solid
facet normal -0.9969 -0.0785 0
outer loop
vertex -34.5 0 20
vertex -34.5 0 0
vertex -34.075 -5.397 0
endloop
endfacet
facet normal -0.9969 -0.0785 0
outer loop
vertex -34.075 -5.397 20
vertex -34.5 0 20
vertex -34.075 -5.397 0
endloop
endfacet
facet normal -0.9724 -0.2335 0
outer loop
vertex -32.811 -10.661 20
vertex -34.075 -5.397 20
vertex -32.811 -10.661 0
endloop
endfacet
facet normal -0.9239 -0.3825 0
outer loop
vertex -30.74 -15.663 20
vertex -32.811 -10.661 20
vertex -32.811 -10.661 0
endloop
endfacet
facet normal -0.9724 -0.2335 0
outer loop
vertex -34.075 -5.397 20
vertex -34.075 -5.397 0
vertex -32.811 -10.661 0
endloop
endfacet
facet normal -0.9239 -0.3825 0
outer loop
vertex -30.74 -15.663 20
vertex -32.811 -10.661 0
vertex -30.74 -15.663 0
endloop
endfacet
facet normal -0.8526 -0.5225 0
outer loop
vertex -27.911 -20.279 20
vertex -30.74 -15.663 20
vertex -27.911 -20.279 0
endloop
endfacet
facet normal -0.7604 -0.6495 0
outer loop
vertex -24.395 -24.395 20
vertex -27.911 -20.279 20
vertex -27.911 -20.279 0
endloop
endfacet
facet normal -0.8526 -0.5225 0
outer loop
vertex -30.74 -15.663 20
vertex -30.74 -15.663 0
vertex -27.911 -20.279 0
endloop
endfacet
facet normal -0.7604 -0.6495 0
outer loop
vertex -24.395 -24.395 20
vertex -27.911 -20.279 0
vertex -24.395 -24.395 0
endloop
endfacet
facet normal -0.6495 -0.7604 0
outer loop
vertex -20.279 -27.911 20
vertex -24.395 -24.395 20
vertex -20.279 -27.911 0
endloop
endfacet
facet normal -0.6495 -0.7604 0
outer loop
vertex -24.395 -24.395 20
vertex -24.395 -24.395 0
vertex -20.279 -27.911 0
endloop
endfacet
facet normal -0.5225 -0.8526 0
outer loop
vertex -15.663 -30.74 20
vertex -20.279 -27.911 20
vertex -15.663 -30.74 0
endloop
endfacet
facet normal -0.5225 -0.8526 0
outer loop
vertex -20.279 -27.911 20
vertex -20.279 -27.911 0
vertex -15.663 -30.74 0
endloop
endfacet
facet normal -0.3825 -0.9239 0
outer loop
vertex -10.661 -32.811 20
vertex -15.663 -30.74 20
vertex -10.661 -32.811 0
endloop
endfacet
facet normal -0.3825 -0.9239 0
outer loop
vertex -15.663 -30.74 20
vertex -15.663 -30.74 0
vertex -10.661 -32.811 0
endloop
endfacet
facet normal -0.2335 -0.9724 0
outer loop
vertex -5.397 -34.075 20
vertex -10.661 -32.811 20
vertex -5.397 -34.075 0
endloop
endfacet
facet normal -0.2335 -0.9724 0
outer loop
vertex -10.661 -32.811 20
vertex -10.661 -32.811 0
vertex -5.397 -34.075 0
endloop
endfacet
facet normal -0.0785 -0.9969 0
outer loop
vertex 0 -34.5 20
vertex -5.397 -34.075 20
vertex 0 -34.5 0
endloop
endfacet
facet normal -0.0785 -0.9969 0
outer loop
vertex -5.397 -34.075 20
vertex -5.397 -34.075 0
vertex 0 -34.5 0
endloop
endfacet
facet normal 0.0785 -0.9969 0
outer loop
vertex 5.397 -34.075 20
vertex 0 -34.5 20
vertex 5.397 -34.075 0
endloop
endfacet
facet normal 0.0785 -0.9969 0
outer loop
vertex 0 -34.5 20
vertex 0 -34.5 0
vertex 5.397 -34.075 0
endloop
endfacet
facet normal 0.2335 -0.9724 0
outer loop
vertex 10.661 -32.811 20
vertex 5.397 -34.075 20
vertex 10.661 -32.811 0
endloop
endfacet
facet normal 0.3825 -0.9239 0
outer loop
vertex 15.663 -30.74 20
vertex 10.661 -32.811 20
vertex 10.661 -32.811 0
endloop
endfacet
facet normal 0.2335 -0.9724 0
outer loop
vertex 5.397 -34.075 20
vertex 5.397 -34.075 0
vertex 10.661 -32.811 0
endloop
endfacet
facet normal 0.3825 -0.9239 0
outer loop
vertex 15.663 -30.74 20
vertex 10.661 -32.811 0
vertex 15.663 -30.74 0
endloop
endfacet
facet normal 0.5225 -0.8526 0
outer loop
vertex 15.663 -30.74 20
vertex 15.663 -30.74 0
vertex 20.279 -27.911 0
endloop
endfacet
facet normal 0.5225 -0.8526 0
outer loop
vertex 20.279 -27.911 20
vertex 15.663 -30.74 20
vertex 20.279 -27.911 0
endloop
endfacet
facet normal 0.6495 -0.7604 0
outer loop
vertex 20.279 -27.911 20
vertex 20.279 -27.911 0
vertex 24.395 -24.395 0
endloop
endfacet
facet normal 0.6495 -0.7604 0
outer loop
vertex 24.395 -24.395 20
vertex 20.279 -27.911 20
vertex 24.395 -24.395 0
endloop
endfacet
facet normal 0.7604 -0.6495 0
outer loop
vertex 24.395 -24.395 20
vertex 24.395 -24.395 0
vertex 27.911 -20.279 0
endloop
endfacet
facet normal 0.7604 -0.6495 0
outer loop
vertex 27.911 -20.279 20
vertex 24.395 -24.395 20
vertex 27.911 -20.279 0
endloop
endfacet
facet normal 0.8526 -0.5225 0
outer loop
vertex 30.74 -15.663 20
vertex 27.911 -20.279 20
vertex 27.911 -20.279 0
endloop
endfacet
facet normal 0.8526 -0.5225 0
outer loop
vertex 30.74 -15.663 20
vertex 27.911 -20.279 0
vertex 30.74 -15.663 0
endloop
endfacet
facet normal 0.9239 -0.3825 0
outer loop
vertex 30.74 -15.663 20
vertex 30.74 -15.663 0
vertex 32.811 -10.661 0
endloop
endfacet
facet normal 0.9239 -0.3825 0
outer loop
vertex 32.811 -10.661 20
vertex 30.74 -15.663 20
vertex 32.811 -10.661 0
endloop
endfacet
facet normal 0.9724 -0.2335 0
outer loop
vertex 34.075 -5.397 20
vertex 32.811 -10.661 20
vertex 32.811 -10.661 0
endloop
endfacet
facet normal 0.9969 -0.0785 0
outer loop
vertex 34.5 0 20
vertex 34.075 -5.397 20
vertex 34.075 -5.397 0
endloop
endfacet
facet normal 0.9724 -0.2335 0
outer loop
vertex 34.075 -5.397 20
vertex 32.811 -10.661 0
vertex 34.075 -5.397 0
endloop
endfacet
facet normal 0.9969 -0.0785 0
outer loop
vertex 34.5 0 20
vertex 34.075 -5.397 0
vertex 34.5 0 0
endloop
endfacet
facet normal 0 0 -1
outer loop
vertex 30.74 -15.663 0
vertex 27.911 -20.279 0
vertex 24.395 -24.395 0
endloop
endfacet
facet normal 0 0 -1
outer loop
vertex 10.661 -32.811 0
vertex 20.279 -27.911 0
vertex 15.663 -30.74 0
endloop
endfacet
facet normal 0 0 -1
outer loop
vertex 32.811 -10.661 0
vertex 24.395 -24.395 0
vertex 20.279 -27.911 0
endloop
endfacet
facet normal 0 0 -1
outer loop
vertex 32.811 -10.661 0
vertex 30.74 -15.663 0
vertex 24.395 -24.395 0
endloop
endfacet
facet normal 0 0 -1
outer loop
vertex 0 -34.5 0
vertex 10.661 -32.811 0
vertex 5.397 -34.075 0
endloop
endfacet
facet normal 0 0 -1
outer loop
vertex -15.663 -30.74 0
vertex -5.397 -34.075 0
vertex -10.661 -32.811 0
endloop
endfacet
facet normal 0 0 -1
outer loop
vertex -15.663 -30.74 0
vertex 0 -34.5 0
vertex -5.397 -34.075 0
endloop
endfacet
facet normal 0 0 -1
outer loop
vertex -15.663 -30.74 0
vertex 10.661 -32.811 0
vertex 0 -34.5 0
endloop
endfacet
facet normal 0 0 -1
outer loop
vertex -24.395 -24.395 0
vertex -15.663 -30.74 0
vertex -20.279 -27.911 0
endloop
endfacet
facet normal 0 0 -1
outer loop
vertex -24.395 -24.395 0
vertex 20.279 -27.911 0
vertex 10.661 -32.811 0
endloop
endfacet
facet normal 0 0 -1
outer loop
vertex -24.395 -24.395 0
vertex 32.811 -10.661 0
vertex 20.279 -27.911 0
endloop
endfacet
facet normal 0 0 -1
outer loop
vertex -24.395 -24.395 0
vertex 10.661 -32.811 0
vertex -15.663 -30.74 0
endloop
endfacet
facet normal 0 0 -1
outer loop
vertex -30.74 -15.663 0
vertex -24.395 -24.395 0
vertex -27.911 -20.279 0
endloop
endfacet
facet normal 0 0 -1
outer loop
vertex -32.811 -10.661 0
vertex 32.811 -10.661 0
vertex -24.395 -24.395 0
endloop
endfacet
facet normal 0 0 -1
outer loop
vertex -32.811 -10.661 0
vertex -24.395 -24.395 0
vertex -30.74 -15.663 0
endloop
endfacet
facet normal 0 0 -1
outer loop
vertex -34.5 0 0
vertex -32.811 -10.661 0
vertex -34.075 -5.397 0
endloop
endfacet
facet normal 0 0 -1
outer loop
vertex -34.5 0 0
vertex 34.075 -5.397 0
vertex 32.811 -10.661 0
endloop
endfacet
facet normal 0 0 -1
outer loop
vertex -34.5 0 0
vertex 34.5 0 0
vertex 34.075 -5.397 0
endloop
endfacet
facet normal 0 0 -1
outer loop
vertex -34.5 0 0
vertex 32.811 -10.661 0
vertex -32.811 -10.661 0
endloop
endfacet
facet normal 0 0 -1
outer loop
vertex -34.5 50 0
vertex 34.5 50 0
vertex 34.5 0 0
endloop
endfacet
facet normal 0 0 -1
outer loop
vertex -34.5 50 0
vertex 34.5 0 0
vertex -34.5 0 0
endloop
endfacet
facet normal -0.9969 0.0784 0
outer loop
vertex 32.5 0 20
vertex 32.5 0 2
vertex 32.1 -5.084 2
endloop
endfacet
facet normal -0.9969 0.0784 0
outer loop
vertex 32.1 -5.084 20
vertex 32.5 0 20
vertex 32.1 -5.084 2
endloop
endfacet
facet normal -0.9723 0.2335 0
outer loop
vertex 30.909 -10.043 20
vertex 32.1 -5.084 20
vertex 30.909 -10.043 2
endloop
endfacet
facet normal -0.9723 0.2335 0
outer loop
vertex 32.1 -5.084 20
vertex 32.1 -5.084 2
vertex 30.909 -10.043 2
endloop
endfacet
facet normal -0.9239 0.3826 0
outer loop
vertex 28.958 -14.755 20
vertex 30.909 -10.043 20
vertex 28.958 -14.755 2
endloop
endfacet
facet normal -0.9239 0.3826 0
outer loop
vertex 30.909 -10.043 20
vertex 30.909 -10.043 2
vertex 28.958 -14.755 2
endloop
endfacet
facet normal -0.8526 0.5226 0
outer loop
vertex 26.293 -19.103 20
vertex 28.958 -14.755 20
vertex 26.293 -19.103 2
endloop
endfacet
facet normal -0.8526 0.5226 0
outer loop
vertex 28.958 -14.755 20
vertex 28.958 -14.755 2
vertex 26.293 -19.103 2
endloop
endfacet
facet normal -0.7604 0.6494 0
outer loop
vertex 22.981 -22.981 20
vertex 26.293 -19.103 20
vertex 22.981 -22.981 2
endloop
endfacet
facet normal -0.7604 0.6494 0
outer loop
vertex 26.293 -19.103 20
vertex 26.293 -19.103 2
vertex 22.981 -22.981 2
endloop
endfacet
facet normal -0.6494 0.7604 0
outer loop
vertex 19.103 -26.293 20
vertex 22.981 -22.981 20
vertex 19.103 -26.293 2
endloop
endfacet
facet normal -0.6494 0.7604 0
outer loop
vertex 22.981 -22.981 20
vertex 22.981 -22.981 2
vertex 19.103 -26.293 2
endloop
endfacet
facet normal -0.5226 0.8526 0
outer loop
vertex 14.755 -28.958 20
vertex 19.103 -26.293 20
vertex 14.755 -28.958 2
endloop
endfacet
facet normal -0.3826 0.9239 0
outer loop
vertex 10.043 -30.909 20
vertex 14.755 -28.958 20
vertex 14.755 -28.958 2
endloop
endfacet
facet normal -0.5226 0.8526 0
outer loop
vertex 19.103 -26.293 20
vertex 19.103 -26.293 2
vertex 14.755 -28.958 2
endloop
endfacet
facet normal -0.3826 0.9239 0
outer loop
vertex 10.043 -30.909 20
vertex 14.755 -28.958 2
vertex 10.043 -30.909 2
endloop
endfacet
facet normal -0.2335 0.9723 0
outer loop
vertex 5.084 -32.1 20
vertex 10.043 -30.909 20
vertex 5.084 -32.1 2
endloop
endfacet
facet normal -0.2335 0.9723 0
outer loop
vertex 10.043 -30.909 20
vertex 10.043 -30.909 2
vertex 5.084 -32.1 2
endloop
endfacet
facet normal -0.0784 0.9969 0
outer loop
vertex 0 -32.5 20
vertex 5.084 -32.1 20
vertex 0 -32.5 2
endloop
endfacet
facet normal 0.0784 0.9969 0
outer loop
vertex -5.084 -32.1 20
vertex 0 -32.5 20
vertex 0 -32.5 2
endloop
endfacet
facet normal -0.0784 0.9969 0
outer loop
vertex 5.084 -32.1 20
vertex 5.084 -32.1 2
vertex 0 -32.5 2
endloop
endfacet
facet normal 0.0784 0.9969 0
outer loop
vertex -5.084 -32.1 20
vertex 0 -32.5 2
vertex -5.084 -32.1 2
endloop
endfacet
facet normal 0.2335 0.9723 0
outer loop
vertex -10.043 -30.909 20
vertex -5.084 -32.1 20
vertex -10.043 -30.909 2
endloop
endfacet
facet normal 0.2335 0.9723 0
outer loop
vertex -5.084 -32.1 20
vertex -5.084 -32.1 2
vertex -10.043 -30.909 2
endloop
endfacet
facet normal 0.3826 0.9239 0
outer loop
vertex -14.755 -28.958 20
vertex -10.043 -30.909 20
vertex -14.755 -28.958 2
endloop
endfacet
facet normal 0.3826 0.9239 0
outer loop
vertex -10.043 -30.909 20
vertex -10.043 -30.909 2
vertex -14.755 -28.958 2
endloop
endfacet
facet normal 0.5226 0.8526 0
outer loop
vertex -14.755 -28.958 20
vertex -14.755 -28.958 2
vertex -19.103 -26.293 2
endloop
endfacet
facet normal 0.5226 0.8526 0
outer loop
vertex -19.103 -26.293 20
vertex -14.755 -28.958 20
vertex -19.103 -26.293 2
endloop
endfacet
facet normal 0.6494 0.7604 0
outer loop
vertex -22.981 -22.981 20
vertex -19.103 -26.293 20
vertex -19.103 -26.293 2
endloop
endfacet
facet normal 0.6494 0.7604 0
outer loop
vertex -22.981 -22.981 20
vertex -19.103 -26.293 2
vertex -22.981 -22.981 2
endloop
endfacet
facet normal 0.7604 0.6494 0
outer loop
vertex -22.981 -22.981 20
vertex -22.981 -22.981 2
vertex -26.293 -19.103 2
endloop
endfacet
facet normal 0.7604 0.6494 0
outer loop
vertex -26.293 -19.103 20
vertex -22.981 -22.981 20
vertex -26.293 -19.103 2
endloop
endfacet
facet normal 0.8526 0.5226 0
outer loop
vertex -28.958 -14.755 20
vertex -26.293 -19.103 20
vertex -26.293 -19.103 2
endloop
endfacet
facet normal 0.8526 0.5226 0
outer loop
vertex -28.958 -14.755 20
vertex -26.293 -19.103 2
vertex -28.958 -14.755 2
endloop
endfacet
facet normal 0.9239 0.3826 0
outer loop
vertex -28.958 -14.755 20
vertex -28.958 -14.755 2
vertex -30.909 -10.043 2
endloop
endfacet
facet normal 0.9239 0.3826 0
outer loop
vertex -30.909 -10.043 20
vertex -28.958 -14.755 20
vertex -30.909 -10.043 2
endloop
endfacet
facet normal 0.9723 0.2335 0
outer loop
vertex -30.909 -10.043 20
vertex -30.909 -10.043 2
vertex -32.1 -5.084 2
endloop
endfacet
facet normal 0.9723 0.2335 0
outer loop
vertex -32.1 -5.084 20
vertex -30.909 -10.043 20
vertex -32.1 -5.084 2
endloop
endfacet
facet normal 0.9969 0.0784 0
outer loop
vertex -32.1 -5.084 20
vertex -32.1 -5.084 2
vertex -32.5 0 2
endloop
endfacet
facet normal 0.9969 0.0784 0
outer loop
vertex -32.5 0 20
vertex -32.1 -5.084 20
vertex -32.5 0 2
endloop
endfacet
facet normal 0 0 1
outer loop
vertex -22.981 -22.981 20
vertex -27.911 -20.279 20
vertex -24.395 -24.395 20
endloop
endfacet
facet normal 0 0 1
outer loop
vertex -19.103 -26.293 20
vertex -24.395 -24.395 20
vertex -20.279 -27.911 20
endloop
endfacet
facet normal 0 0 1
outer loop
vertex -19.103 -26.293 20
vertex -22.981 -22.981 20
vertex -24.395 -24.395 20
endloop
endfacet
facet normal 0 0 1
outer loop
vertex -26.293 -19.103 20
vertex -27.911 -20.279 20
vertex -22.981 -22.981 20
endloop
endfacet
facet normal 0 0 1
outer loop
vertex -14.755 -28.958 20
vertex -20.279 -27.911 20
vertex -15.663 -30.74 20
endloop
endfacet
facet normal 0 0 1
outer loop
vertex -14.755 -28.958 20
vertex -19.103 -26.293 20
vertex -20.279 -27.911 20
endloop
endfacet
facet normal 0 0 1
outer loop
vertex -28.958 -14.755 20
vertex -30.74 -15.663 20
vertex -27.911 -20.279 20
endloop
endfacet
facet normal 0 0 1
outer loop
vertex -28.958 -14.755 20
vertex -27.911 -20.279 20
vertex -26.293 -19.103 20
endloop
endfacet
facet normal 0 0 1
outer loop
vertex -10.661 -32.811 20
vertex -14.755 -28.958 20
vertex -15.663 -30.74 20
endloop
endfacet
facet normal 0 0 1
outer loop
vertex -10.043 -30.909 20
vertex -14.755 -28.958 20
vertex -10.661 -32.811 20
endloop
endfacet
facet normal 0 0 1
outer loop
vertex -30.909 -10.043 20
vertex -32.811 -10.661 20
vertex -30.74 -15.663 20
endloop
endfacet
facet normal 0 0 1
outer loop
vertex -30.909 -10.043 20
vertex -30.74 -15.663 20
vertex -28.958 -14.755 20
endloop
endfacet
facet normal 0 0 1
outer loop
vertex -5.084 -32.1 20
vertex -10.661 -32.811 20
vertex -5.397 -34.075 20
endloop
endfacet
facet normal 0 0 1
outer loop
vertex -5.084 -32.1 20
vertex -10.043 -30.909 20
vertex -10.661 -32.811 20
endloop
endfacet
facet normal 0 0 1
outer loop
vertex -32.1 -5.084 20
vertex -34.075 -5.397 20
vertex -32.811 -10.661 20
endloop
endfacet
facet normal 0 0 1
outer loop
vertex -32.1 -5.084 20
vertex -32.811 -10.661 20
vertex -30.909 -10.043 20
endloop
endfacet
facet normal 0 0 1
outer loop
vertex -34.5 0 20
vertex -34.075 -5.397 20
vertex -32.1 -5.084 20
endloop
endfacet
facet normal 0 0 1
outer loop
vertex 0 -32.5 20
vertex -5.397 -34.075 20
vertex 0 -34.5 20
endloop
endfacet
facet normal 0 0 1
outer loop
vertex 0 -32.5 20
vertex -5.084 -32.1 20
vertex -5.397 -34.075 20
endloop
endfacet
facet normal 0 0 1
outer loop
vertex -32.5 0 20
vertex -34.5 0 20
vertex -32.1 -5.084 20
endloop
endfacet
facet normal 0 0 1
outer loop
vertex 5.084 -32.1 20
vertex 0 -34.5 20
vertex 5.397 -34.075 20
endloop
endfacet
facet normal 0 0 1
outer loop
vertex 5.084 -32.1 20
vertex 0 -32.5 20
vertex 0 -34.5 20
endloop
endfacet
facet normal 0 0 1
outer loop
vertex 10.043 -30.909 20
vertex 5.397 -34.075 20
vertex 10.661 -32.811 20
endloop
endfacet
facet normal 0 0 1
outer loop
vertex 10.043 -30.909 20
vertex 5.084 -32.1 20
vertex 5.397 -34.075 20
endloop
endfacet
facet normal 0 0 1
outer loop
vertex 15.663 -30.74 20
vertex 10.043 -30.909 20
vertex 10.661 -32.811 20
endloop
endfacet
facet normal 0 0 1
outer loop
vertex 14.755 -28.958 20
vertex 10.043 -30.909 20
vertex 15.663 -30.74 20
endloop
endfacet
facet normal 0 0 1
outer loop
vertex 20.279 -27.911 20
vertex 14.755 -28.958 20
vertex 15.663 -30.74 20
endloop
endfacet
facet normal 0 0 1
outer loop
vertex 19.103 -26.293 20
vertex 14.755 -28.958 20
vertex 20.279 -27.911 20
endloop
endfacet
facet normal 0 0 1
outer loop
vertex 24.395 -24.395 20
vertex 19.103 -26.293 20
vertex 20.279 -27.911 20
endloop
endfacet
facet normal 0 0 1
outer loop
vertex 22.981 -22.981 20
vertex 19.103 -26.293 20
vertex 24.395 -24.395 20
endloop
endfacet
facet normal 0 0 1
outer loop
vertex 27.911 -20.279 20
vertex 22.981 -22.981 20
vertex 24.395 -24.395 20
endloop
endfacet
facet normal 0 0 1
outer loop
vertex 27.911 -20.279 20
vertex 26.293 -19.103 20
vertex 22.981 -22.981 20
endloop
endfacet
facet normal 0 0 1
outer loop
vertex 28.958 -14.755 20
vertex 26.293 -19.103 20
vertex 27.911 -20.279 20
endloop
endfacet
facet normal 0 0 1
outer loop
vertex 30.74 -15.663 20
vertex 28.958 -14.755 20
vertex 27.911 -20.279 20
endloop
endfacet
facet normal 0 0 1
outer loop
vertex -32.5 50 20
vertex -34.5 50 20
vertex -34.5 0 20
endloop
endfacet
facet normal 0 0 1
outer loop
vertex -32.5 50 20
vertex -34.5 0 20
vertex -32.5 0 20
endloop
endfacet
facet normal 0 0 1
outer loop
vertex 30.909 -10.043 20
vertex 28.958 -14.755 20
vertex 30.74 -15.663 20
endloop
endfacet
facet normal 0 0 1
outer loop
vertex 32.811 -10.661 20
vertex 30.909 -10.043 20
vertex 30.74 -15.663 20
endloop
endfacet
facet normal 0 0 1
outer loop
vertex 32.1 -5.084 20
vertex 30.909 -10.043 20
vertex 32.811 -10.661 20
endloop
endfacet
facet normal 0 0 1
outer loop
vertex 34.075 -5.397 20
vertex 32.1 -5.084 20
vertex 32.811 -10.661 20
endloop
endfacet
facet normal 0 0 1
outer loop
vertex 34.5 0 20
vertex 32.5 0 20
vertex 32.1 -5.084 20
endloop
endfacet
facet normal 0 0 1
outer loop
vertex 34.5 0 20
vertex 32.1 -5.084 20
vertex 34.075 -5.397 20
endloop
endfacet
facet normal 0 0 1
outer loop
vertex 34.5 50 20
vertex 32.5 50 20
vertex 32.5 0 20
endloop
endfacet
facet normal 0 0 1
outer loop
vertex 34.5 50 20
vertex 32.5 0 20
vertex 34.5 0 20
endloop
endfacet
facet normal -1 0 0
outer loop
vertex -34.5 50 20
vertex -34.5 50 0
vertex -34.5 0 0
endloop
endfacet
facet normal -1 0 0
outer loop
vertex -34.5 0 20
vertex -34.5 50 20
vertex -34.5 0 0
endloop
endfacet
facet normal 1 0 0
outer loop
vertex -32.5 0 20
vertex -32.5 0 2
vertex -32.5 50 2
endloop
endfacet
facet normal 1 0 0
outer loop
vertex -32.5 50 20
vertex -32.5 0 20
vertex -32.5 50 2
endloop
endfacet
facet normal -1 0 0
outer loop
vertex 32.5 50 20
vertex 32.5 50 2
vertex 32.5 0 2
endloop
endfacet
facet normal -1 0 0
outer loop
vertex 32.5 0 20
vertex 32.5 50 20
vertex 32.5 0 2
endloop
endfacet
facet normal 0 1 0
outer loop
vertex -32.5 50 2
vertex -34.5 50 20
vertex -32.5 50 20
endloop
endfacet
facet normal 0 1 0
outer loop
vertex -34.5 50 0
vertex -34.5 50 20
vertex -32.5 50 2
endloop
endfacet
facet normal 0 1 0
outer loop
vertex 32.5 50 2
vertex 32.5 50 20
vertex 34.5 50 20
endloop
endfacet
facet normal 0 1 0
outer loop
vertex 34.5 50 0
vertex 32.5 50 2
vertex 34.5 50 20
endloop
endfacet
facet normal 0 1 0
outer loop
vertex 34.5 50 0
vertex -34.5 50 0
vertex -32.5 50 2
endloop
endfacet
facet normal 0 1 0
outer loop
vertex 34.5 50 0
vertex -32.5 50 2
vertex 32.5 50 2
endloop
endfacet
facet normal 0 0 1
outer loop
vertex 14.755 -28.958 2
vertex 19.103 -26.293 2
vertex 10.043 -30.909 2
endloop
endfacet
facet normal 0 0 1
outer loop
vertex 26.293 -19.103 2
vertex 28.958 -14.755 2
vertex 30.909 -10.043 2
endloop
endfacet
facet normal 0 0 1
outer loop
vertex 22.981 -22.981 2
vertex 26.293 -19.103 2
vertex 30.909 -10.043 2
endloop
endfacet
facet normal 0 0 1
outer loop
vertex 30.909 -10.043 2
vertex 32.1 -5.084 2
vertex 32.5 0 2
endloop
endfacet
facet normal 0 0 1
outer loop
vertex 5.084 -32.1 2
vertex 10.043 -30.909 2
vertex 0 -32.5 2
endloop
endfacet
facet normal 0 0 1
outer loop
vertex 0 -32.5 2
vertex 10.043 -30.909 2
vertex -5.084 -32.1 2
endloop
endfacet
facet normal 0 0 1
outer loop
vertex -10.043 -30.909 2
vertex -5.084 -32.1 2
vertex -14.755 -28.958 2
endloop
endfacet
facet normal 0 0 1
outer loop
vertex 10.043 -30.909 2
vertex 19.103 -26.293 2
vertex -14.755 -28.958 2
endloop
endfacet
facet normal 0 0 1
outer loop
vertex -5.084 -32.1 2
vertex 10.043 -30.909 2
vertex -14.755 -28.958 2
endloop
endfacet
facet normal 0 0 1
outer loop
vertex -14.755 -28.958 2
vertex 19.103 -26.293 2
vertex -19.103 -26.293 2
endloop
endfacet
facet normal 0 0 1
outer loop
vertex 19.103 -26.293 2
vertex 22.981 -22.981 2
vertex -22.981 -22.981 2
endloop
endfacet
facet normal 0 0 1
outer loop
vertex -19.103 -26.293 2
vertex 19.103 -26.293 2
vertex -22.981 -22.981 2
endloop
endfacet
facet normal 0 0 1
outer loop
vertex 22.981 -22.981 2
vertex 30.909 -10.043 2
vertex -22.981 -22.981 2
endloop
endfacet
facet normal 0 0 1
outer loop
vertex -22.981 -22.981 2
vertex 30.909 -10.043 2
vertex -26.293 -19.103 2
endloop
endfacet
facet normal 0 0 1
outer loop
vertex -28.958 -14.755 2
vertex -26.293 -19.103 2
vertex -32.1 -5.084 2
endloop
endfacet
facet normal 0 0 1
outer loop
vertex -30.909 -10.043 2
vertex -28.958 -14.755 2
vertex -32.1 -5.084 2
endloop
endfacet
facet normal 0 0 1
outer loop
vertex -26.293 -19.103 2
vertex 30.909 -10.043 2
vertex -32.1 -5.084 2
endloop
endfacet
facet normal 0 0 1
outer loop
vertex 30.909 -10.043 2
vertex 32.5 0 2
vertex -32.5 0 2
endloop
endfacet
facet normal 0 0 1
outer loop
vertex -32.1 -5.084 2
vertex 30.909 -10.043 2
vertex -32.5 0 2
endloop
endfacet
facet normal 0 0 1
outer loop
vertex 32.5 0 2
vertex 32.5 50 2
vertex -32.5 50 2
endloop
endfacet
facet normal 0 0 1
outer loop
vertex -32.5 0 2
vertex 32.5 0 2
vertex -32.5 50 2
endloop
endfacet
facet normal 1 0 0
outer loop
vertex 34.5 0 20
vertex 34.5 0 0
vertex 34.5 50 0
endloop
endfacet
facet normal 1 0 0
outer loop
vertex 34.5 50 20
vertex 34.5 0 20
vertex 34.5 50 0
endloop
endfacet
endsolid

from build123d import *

# Parameters (mm, degrees)
DODANIE_WYCI_GNI_CIE1_DEPTH = 20
DODANIE_WYCI_GNI_CIE2_DEPTH = 2


with BuildPart() as part:
    # Szkic1 → Dodanie-wyci_gni_cie1 (new body)
    with BuildSketch(Plane.XY):
        with BuildLine():
            ThreePointArc((-34.5, 0), (0, -34.5), (34.5, 0))
            Line((34.5, 0), (34.5, 50))
            Line((34.5, 50), (32.5, 50))
            Line((32.5, 50), (32.5, 0))
            ThreePointArc((32.5, 0), (0, -32.5), (-32.5, 0))
            Line((-32.5, 0), (-32.5, 50))
            Line((-32.5, 50), (-34.5, 50))
            Line((-34.5, 50), (-34.5, 0))
        make_face()
    extrude(amount=DODANIE_WYCI_GNI_CIE1_DEPTH)

    # Szkic1_3 → Dodanie-wyci_gni_cie2 (add)
    with BuildSketch(Plane.XY):
        with BuildLine():
            Line((32.5, 0), (32.5, 50))
            Line((32.5, 50), (-32.5, 50))
            Line((-32.5, 50), (-32.5, 0))
            ThreePointArc((-32.5, 0), (0, -32.5), (32.5, 0))
        make_face()
    extrude(amount=DODANIE_WYCI_GNI_CIE2_DEPTH)


solid = part.part
